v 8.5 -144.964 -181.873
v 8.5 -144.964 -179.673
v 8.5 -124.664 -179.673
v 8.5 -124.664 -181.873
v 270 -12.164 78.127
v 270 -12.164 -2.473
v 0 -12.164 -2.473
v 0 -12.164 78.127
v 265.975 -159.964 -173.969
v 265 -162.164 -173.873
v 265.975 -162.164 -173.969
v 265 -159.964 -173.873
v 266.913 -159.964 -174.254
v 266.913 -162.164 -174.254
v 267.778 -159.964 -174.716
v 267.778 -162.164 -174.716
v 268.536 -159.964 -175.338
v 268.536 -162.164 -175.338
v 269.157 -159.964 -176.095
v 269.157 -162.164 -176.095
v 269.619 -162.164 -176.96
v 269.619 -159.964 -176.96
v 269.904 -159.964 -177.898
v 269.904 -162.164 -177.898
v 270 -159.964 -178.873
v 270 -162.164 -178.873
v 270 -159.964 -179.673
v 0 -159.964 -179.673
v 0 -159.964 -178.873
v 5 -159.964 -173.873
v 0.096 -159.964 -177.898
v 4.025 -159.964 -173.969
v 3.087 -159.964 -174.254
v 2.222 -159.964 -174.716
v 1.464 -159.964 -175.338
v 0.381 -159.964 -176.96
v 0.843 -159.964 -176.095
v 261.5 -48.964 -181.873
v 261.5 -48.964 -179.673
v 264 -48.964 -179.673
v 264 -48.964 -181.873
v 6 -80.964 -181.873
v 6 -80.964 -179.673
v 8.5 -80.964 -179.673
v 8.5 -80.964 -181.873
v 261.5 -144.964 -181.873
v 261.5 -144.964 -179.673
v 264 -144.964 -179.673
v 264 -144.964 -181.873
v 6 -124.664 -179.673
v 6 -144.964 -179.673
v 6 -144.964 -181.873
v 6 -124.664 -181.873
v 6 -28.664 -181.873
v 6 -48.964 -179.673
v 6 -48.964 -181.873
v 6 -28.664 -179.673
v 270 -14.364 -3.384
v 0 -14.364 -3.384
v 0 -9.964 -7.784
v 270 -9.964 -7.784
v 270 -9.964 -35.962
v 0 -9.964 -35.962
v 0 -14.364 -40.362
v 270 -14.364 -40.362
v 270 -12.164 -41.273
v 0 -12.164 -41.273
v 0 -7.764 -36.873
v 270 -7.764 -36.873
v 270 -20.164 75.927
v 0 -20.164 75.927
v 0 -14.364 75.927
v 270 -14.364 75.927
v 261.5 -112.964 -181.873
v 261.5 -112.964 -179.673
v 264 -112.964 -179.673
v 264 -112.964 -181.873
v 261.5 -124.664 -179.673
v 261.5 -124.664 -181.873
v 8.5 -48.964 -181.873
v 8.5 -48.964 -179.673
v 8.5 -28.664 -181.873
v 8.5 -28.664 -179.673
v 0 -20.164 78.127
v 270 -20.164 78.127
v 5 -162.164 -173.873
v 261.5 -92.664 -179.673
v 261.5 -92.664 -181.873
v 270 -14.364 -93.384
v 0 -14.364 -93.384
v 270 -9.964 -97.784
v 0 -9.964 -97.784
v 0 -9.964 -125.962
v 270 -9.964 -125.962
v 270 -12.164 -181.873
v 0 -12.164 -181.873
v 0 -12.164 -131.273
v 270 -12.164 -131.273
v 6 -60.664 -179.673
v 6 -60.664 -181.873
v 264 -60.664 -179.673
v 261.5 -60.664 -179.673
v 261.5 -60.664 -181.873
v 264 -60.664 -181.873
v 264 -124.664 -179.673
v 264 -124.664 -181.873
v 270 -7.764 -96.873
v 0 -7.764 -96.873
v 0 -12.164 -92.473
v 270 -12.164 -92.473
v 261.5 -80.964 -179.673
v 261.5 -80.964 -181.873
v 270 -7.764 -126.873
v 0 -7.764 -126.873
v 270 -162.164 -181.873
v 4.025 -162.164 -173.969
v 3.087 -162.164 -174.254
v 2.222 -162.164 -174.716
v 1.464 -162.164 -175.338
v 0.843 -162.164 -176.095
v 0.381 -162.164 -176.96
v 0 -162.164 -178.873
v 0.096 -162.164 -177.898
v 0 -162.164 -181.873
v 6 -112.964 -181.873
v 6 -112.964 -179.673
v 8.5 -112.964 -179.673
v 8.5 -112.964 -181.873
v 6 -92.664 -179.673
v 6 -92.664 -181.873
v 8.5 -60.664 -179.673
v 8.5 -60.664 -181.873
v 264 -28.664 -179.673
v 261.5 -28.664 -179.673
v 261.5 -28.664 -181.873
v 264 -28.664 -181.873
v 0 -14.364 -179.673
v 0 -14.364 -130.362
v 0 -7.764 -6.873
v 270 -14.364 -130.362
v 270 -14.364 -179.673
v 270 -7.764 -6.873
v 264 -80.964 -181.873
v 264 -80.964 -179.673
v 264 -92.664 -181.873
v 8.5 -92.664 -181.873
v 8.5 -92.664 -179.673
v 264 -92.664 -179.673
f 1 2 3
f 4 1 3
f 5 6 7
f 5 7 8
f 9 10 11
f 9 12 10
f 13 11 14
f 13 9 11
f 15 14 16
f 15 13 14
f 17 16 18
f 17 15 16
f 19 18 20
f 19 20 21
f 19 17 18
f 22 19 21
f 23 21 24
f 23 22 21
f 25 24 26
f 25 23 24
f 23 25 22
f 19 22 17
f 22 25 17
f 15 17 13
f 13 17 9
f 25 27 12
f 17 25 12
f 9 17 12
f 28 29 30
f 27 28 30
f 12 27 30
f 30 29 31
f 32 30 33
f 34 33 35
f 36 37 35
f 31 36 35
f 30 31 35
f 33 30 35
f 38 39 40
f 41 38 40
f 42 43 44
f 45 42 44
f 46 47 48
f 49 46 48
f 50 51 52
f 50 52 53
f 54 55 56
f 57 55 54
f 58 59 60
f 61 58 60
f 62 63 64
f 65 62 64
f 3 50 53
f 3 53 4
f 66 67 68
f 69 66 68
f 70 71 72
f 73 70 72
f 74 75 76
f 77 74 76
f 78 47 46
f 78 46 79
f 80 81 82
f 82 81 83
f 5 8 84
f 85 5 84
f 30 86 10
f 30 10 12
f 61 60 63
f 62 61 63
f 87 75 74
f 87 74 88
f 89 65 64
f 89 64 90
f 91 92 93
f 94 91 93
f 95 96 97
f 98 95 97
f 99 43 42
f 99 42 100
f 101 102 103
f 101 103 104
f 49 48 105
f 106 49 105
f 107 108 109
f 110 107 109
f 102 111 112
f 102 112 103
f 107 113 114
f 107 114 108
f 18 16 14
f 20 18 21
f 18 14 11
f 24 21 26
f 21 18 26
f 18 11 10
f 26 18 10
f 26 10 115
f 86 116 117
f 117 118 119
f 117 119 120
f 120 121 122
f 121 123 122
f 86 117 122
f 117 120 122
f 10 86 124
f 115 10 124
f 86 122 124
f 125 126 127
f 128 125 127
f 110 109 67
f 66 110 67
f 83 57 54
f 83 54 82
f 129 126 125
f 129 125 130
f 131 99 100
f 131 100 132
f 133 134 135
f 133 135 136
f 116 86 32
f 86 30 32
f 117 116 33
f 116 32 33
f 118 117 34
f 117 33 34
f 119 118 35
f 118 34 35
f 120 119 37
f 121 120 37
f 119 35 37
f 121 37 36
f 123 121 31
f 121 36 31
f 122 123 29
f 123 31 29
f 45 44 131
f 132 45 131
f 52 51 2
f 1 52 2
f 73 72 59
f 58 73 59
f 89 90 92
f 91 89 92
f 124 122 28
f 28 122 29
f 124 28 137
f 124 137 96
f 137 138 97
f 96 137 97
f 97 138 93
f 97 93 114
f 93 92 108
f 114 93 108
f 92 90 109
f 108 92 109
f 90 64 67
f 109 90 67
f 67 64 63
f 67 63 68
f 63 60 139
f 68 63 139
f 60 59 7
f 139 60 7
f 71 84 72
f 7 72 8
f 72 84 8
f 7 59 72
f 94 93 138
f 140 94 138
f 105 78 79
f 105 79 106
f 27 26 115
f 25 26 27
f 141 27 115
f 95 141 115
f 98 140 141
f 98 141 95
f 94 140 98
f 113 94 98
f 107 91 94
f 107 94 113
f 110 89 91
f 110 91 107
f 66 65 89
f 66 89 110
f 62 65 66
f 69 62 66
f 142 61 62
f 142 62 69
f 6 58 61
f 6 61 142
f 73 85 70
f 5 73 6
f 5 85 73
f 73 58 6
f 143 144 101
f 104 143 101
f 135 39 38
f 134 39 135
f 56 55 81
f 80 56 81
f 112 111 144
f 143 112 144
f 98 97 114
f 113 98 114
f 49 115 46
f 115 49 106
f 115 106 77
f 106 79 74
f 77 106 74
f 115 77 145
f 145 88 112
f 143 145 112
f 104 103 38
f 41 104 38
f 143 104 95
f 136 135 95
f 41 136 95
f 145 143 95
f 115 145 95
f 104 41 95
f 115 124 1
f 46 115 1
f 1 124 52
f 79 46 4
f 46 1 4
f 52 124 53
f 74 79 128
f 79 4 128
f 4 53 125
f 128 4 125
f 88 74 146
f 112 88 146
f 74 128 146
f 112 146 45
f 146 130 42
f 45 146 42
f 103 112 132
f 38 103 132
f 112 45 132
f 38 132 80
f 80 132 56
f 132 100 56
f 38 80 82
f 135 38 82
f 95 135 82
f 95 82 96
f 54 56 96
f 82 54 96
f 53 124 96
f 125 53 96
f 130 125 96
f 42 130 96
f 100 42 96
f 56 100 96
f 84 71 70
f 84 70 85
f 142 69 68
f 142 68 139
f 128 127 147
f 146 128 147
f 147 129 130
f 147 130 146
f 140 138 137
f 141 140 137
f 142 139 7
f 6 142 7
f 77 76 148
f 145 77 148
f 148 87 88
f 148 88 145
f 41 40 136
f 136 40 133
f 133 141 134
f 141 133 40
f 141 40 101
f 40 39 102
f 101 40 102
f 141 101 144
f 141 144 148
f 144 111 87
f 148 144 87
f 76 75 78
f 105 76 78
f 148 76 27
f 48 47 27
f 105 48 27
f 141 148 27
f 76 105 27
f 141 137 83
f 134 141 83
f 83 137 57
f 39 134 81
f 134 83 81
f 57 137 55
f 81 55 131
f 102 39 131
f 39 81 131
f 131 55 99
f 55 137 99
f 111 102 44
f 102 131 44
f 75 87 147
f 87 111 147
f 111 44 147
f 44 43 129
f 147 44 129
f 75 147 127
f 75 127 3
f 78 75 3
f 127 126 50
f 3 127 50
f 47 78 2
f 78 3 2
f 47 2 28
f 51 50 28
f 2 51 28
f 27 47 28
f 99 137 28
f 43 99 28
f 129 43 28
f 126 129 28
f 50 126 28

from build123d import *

# Parameters (mm, degrees)
F0_W     = 5.800000261
F0_H     = 2.2
F0_W_2   = 2.2
F0_H_2   = 5.8
F1_DEPTH = 270
F2_R     = 5
F3_W     = 2.5
F3_H     = 20.3
F4_DEPTH = 25


with BuildPart() as f1:
    # F0 (on Right) → F1 (new body)
    with BuildSketch(Plane.YZ):
        Polygon((-14.3636103166, 75.9268823147), (-14.3636103166, 68.1268823147), (-14.3636103166, -0.2731176853), (-12.1636103166, -2.4731176853), (-12.1636103166, 68.1268823147), (-12.1636103166, 75.9268823147), align=None)
        Polygon((-12.1636103166, -2.4731176853), (-14.3636103166, -0.2731176853), (-14.3636103166, -3.3843875225), (-12.1636103166, -5.5843875225), align=None)
        with Locations((-17.2636104471, 77.0268823147)):
            Rectangle(F0_W, F0_H)
        with Locations((-13.2636103166, 77.0268823147)):
            Rectangle(F0_W_2, F0_H)
        Polygon((-7.7636103166, -6.8731176853), (-12.1636103166, -2.4731176853), (-12.1636103166, -5.5843875225), (-9.9636103166, -7.7843875225), (-9.9636103166, -35.9618478481), (-12.1636103166, -38.1618478481), (-12.1636103166, -41.2731176853), (-7.7636103166, -36.8731176853), align=None)
        Polygon((-14.3636103166, -43.4731176853), (-12.1636103166, -41.2731176853), (-12.1636103166, -38.1618478481), (-14.3636103166, -40.3618478481), align=None)
        Polygon((-12.1636103166, -92.4731176853), (-12.1636103166, -41.2731176853), (-14.3636103166, -43.4731176853), (-14.3636103166, -90.2731176853), align=None)
        Polygon((-7.7636103166, -96.8731176853), (-12.1636103166, -92.4731176853), (-12.1636103166, -95.5843875225), (-9.9636103166, -97.7843875225), (-9.9636103166, -125.9618478481), (-12.1636103166, -128.1618478481), (-12.1636103166, -131.2731176853), (-7.7636103166, -126.8731176853), align=None)
        Polygon((-12.1636103166, -95.5843875225), (-12.1636103166, -92.4731176853), (-14.3636103166, -90.2731176853), (-14.3636103166, -93.3843875225), align=None)
        Polygon((-14.3636103166, -133.4731176853), (-12.1636103166, -131.2731176853), (-12.1636103166, -128.1618478481), (-14.3636103166, -130.3618478481), align=None)
        Polygon((-12.1636103166, -179.6731176853), (-12.1636103166, -131.2731176853), (-14.3636103166, -133.4731176853), (-14.3636103166, -179.6731176853), align=None)
        Polygon((-12.1636103166, -181.8731176853), (-12.1636103166, -179.6731176853), (-14.3636103166, -179.6731176853), (-159.9636103166, -179.6731176853), (-159.9636103166, -181.8731176853), align=None)
        with Locations((-161.0636103166, -180.7731176853)):
            Rectangle(F0_W_2, F0_H)
        with Locations((-161.0636103166, -176.7731176853)):
            Rectangle(F0_W_2, F0_H_2)
    extrude(amount=F1_DEPTH)

    # F2
    f2_edges = [f1.edges().sort_by_distance(p)[0] for p in [
        (270, -161.06361, -173.873118),
        (0, -161.06361, -173.873118),
    ]]
    fillet(f2_edges, radius=F2_R)

    # F3 (on face) → F4 (cut)
    with BuildSketch(Plane.XY.offset(-179.6731176853)):
        with Locations((7.25, -134.8136103166)):
            Rectangle(F3_W, F3_H)
        with Locations((7.25, -102.8136103166)):
            Rectangle(F3_W, F3_H)
        with Locations((7.25, -70.8136103166)):
            Rectangle(F3_W, F3_H)
        with Locations((7.25, -38.8136103166)):
            Rectangle(F3_W, F3_H)
        with Locations((262.75, -134.8136103166)):
            Rectangle(F3_W, F3_H)
        with Locations((262.75, -102.8136103166)):
            Rectangle(F3_W, F3_H)
        with Locations((262.75, -70.8136103166)):
            Rectangle(F3_W, F3_H)
        with Locations((262.75, -38.8136103166)):
            Rectangle(F3_W, F3_H)
    extrude(amount=-F4_DEPTH, mode=Mode.SUBTRACT)


solid = f1.part
